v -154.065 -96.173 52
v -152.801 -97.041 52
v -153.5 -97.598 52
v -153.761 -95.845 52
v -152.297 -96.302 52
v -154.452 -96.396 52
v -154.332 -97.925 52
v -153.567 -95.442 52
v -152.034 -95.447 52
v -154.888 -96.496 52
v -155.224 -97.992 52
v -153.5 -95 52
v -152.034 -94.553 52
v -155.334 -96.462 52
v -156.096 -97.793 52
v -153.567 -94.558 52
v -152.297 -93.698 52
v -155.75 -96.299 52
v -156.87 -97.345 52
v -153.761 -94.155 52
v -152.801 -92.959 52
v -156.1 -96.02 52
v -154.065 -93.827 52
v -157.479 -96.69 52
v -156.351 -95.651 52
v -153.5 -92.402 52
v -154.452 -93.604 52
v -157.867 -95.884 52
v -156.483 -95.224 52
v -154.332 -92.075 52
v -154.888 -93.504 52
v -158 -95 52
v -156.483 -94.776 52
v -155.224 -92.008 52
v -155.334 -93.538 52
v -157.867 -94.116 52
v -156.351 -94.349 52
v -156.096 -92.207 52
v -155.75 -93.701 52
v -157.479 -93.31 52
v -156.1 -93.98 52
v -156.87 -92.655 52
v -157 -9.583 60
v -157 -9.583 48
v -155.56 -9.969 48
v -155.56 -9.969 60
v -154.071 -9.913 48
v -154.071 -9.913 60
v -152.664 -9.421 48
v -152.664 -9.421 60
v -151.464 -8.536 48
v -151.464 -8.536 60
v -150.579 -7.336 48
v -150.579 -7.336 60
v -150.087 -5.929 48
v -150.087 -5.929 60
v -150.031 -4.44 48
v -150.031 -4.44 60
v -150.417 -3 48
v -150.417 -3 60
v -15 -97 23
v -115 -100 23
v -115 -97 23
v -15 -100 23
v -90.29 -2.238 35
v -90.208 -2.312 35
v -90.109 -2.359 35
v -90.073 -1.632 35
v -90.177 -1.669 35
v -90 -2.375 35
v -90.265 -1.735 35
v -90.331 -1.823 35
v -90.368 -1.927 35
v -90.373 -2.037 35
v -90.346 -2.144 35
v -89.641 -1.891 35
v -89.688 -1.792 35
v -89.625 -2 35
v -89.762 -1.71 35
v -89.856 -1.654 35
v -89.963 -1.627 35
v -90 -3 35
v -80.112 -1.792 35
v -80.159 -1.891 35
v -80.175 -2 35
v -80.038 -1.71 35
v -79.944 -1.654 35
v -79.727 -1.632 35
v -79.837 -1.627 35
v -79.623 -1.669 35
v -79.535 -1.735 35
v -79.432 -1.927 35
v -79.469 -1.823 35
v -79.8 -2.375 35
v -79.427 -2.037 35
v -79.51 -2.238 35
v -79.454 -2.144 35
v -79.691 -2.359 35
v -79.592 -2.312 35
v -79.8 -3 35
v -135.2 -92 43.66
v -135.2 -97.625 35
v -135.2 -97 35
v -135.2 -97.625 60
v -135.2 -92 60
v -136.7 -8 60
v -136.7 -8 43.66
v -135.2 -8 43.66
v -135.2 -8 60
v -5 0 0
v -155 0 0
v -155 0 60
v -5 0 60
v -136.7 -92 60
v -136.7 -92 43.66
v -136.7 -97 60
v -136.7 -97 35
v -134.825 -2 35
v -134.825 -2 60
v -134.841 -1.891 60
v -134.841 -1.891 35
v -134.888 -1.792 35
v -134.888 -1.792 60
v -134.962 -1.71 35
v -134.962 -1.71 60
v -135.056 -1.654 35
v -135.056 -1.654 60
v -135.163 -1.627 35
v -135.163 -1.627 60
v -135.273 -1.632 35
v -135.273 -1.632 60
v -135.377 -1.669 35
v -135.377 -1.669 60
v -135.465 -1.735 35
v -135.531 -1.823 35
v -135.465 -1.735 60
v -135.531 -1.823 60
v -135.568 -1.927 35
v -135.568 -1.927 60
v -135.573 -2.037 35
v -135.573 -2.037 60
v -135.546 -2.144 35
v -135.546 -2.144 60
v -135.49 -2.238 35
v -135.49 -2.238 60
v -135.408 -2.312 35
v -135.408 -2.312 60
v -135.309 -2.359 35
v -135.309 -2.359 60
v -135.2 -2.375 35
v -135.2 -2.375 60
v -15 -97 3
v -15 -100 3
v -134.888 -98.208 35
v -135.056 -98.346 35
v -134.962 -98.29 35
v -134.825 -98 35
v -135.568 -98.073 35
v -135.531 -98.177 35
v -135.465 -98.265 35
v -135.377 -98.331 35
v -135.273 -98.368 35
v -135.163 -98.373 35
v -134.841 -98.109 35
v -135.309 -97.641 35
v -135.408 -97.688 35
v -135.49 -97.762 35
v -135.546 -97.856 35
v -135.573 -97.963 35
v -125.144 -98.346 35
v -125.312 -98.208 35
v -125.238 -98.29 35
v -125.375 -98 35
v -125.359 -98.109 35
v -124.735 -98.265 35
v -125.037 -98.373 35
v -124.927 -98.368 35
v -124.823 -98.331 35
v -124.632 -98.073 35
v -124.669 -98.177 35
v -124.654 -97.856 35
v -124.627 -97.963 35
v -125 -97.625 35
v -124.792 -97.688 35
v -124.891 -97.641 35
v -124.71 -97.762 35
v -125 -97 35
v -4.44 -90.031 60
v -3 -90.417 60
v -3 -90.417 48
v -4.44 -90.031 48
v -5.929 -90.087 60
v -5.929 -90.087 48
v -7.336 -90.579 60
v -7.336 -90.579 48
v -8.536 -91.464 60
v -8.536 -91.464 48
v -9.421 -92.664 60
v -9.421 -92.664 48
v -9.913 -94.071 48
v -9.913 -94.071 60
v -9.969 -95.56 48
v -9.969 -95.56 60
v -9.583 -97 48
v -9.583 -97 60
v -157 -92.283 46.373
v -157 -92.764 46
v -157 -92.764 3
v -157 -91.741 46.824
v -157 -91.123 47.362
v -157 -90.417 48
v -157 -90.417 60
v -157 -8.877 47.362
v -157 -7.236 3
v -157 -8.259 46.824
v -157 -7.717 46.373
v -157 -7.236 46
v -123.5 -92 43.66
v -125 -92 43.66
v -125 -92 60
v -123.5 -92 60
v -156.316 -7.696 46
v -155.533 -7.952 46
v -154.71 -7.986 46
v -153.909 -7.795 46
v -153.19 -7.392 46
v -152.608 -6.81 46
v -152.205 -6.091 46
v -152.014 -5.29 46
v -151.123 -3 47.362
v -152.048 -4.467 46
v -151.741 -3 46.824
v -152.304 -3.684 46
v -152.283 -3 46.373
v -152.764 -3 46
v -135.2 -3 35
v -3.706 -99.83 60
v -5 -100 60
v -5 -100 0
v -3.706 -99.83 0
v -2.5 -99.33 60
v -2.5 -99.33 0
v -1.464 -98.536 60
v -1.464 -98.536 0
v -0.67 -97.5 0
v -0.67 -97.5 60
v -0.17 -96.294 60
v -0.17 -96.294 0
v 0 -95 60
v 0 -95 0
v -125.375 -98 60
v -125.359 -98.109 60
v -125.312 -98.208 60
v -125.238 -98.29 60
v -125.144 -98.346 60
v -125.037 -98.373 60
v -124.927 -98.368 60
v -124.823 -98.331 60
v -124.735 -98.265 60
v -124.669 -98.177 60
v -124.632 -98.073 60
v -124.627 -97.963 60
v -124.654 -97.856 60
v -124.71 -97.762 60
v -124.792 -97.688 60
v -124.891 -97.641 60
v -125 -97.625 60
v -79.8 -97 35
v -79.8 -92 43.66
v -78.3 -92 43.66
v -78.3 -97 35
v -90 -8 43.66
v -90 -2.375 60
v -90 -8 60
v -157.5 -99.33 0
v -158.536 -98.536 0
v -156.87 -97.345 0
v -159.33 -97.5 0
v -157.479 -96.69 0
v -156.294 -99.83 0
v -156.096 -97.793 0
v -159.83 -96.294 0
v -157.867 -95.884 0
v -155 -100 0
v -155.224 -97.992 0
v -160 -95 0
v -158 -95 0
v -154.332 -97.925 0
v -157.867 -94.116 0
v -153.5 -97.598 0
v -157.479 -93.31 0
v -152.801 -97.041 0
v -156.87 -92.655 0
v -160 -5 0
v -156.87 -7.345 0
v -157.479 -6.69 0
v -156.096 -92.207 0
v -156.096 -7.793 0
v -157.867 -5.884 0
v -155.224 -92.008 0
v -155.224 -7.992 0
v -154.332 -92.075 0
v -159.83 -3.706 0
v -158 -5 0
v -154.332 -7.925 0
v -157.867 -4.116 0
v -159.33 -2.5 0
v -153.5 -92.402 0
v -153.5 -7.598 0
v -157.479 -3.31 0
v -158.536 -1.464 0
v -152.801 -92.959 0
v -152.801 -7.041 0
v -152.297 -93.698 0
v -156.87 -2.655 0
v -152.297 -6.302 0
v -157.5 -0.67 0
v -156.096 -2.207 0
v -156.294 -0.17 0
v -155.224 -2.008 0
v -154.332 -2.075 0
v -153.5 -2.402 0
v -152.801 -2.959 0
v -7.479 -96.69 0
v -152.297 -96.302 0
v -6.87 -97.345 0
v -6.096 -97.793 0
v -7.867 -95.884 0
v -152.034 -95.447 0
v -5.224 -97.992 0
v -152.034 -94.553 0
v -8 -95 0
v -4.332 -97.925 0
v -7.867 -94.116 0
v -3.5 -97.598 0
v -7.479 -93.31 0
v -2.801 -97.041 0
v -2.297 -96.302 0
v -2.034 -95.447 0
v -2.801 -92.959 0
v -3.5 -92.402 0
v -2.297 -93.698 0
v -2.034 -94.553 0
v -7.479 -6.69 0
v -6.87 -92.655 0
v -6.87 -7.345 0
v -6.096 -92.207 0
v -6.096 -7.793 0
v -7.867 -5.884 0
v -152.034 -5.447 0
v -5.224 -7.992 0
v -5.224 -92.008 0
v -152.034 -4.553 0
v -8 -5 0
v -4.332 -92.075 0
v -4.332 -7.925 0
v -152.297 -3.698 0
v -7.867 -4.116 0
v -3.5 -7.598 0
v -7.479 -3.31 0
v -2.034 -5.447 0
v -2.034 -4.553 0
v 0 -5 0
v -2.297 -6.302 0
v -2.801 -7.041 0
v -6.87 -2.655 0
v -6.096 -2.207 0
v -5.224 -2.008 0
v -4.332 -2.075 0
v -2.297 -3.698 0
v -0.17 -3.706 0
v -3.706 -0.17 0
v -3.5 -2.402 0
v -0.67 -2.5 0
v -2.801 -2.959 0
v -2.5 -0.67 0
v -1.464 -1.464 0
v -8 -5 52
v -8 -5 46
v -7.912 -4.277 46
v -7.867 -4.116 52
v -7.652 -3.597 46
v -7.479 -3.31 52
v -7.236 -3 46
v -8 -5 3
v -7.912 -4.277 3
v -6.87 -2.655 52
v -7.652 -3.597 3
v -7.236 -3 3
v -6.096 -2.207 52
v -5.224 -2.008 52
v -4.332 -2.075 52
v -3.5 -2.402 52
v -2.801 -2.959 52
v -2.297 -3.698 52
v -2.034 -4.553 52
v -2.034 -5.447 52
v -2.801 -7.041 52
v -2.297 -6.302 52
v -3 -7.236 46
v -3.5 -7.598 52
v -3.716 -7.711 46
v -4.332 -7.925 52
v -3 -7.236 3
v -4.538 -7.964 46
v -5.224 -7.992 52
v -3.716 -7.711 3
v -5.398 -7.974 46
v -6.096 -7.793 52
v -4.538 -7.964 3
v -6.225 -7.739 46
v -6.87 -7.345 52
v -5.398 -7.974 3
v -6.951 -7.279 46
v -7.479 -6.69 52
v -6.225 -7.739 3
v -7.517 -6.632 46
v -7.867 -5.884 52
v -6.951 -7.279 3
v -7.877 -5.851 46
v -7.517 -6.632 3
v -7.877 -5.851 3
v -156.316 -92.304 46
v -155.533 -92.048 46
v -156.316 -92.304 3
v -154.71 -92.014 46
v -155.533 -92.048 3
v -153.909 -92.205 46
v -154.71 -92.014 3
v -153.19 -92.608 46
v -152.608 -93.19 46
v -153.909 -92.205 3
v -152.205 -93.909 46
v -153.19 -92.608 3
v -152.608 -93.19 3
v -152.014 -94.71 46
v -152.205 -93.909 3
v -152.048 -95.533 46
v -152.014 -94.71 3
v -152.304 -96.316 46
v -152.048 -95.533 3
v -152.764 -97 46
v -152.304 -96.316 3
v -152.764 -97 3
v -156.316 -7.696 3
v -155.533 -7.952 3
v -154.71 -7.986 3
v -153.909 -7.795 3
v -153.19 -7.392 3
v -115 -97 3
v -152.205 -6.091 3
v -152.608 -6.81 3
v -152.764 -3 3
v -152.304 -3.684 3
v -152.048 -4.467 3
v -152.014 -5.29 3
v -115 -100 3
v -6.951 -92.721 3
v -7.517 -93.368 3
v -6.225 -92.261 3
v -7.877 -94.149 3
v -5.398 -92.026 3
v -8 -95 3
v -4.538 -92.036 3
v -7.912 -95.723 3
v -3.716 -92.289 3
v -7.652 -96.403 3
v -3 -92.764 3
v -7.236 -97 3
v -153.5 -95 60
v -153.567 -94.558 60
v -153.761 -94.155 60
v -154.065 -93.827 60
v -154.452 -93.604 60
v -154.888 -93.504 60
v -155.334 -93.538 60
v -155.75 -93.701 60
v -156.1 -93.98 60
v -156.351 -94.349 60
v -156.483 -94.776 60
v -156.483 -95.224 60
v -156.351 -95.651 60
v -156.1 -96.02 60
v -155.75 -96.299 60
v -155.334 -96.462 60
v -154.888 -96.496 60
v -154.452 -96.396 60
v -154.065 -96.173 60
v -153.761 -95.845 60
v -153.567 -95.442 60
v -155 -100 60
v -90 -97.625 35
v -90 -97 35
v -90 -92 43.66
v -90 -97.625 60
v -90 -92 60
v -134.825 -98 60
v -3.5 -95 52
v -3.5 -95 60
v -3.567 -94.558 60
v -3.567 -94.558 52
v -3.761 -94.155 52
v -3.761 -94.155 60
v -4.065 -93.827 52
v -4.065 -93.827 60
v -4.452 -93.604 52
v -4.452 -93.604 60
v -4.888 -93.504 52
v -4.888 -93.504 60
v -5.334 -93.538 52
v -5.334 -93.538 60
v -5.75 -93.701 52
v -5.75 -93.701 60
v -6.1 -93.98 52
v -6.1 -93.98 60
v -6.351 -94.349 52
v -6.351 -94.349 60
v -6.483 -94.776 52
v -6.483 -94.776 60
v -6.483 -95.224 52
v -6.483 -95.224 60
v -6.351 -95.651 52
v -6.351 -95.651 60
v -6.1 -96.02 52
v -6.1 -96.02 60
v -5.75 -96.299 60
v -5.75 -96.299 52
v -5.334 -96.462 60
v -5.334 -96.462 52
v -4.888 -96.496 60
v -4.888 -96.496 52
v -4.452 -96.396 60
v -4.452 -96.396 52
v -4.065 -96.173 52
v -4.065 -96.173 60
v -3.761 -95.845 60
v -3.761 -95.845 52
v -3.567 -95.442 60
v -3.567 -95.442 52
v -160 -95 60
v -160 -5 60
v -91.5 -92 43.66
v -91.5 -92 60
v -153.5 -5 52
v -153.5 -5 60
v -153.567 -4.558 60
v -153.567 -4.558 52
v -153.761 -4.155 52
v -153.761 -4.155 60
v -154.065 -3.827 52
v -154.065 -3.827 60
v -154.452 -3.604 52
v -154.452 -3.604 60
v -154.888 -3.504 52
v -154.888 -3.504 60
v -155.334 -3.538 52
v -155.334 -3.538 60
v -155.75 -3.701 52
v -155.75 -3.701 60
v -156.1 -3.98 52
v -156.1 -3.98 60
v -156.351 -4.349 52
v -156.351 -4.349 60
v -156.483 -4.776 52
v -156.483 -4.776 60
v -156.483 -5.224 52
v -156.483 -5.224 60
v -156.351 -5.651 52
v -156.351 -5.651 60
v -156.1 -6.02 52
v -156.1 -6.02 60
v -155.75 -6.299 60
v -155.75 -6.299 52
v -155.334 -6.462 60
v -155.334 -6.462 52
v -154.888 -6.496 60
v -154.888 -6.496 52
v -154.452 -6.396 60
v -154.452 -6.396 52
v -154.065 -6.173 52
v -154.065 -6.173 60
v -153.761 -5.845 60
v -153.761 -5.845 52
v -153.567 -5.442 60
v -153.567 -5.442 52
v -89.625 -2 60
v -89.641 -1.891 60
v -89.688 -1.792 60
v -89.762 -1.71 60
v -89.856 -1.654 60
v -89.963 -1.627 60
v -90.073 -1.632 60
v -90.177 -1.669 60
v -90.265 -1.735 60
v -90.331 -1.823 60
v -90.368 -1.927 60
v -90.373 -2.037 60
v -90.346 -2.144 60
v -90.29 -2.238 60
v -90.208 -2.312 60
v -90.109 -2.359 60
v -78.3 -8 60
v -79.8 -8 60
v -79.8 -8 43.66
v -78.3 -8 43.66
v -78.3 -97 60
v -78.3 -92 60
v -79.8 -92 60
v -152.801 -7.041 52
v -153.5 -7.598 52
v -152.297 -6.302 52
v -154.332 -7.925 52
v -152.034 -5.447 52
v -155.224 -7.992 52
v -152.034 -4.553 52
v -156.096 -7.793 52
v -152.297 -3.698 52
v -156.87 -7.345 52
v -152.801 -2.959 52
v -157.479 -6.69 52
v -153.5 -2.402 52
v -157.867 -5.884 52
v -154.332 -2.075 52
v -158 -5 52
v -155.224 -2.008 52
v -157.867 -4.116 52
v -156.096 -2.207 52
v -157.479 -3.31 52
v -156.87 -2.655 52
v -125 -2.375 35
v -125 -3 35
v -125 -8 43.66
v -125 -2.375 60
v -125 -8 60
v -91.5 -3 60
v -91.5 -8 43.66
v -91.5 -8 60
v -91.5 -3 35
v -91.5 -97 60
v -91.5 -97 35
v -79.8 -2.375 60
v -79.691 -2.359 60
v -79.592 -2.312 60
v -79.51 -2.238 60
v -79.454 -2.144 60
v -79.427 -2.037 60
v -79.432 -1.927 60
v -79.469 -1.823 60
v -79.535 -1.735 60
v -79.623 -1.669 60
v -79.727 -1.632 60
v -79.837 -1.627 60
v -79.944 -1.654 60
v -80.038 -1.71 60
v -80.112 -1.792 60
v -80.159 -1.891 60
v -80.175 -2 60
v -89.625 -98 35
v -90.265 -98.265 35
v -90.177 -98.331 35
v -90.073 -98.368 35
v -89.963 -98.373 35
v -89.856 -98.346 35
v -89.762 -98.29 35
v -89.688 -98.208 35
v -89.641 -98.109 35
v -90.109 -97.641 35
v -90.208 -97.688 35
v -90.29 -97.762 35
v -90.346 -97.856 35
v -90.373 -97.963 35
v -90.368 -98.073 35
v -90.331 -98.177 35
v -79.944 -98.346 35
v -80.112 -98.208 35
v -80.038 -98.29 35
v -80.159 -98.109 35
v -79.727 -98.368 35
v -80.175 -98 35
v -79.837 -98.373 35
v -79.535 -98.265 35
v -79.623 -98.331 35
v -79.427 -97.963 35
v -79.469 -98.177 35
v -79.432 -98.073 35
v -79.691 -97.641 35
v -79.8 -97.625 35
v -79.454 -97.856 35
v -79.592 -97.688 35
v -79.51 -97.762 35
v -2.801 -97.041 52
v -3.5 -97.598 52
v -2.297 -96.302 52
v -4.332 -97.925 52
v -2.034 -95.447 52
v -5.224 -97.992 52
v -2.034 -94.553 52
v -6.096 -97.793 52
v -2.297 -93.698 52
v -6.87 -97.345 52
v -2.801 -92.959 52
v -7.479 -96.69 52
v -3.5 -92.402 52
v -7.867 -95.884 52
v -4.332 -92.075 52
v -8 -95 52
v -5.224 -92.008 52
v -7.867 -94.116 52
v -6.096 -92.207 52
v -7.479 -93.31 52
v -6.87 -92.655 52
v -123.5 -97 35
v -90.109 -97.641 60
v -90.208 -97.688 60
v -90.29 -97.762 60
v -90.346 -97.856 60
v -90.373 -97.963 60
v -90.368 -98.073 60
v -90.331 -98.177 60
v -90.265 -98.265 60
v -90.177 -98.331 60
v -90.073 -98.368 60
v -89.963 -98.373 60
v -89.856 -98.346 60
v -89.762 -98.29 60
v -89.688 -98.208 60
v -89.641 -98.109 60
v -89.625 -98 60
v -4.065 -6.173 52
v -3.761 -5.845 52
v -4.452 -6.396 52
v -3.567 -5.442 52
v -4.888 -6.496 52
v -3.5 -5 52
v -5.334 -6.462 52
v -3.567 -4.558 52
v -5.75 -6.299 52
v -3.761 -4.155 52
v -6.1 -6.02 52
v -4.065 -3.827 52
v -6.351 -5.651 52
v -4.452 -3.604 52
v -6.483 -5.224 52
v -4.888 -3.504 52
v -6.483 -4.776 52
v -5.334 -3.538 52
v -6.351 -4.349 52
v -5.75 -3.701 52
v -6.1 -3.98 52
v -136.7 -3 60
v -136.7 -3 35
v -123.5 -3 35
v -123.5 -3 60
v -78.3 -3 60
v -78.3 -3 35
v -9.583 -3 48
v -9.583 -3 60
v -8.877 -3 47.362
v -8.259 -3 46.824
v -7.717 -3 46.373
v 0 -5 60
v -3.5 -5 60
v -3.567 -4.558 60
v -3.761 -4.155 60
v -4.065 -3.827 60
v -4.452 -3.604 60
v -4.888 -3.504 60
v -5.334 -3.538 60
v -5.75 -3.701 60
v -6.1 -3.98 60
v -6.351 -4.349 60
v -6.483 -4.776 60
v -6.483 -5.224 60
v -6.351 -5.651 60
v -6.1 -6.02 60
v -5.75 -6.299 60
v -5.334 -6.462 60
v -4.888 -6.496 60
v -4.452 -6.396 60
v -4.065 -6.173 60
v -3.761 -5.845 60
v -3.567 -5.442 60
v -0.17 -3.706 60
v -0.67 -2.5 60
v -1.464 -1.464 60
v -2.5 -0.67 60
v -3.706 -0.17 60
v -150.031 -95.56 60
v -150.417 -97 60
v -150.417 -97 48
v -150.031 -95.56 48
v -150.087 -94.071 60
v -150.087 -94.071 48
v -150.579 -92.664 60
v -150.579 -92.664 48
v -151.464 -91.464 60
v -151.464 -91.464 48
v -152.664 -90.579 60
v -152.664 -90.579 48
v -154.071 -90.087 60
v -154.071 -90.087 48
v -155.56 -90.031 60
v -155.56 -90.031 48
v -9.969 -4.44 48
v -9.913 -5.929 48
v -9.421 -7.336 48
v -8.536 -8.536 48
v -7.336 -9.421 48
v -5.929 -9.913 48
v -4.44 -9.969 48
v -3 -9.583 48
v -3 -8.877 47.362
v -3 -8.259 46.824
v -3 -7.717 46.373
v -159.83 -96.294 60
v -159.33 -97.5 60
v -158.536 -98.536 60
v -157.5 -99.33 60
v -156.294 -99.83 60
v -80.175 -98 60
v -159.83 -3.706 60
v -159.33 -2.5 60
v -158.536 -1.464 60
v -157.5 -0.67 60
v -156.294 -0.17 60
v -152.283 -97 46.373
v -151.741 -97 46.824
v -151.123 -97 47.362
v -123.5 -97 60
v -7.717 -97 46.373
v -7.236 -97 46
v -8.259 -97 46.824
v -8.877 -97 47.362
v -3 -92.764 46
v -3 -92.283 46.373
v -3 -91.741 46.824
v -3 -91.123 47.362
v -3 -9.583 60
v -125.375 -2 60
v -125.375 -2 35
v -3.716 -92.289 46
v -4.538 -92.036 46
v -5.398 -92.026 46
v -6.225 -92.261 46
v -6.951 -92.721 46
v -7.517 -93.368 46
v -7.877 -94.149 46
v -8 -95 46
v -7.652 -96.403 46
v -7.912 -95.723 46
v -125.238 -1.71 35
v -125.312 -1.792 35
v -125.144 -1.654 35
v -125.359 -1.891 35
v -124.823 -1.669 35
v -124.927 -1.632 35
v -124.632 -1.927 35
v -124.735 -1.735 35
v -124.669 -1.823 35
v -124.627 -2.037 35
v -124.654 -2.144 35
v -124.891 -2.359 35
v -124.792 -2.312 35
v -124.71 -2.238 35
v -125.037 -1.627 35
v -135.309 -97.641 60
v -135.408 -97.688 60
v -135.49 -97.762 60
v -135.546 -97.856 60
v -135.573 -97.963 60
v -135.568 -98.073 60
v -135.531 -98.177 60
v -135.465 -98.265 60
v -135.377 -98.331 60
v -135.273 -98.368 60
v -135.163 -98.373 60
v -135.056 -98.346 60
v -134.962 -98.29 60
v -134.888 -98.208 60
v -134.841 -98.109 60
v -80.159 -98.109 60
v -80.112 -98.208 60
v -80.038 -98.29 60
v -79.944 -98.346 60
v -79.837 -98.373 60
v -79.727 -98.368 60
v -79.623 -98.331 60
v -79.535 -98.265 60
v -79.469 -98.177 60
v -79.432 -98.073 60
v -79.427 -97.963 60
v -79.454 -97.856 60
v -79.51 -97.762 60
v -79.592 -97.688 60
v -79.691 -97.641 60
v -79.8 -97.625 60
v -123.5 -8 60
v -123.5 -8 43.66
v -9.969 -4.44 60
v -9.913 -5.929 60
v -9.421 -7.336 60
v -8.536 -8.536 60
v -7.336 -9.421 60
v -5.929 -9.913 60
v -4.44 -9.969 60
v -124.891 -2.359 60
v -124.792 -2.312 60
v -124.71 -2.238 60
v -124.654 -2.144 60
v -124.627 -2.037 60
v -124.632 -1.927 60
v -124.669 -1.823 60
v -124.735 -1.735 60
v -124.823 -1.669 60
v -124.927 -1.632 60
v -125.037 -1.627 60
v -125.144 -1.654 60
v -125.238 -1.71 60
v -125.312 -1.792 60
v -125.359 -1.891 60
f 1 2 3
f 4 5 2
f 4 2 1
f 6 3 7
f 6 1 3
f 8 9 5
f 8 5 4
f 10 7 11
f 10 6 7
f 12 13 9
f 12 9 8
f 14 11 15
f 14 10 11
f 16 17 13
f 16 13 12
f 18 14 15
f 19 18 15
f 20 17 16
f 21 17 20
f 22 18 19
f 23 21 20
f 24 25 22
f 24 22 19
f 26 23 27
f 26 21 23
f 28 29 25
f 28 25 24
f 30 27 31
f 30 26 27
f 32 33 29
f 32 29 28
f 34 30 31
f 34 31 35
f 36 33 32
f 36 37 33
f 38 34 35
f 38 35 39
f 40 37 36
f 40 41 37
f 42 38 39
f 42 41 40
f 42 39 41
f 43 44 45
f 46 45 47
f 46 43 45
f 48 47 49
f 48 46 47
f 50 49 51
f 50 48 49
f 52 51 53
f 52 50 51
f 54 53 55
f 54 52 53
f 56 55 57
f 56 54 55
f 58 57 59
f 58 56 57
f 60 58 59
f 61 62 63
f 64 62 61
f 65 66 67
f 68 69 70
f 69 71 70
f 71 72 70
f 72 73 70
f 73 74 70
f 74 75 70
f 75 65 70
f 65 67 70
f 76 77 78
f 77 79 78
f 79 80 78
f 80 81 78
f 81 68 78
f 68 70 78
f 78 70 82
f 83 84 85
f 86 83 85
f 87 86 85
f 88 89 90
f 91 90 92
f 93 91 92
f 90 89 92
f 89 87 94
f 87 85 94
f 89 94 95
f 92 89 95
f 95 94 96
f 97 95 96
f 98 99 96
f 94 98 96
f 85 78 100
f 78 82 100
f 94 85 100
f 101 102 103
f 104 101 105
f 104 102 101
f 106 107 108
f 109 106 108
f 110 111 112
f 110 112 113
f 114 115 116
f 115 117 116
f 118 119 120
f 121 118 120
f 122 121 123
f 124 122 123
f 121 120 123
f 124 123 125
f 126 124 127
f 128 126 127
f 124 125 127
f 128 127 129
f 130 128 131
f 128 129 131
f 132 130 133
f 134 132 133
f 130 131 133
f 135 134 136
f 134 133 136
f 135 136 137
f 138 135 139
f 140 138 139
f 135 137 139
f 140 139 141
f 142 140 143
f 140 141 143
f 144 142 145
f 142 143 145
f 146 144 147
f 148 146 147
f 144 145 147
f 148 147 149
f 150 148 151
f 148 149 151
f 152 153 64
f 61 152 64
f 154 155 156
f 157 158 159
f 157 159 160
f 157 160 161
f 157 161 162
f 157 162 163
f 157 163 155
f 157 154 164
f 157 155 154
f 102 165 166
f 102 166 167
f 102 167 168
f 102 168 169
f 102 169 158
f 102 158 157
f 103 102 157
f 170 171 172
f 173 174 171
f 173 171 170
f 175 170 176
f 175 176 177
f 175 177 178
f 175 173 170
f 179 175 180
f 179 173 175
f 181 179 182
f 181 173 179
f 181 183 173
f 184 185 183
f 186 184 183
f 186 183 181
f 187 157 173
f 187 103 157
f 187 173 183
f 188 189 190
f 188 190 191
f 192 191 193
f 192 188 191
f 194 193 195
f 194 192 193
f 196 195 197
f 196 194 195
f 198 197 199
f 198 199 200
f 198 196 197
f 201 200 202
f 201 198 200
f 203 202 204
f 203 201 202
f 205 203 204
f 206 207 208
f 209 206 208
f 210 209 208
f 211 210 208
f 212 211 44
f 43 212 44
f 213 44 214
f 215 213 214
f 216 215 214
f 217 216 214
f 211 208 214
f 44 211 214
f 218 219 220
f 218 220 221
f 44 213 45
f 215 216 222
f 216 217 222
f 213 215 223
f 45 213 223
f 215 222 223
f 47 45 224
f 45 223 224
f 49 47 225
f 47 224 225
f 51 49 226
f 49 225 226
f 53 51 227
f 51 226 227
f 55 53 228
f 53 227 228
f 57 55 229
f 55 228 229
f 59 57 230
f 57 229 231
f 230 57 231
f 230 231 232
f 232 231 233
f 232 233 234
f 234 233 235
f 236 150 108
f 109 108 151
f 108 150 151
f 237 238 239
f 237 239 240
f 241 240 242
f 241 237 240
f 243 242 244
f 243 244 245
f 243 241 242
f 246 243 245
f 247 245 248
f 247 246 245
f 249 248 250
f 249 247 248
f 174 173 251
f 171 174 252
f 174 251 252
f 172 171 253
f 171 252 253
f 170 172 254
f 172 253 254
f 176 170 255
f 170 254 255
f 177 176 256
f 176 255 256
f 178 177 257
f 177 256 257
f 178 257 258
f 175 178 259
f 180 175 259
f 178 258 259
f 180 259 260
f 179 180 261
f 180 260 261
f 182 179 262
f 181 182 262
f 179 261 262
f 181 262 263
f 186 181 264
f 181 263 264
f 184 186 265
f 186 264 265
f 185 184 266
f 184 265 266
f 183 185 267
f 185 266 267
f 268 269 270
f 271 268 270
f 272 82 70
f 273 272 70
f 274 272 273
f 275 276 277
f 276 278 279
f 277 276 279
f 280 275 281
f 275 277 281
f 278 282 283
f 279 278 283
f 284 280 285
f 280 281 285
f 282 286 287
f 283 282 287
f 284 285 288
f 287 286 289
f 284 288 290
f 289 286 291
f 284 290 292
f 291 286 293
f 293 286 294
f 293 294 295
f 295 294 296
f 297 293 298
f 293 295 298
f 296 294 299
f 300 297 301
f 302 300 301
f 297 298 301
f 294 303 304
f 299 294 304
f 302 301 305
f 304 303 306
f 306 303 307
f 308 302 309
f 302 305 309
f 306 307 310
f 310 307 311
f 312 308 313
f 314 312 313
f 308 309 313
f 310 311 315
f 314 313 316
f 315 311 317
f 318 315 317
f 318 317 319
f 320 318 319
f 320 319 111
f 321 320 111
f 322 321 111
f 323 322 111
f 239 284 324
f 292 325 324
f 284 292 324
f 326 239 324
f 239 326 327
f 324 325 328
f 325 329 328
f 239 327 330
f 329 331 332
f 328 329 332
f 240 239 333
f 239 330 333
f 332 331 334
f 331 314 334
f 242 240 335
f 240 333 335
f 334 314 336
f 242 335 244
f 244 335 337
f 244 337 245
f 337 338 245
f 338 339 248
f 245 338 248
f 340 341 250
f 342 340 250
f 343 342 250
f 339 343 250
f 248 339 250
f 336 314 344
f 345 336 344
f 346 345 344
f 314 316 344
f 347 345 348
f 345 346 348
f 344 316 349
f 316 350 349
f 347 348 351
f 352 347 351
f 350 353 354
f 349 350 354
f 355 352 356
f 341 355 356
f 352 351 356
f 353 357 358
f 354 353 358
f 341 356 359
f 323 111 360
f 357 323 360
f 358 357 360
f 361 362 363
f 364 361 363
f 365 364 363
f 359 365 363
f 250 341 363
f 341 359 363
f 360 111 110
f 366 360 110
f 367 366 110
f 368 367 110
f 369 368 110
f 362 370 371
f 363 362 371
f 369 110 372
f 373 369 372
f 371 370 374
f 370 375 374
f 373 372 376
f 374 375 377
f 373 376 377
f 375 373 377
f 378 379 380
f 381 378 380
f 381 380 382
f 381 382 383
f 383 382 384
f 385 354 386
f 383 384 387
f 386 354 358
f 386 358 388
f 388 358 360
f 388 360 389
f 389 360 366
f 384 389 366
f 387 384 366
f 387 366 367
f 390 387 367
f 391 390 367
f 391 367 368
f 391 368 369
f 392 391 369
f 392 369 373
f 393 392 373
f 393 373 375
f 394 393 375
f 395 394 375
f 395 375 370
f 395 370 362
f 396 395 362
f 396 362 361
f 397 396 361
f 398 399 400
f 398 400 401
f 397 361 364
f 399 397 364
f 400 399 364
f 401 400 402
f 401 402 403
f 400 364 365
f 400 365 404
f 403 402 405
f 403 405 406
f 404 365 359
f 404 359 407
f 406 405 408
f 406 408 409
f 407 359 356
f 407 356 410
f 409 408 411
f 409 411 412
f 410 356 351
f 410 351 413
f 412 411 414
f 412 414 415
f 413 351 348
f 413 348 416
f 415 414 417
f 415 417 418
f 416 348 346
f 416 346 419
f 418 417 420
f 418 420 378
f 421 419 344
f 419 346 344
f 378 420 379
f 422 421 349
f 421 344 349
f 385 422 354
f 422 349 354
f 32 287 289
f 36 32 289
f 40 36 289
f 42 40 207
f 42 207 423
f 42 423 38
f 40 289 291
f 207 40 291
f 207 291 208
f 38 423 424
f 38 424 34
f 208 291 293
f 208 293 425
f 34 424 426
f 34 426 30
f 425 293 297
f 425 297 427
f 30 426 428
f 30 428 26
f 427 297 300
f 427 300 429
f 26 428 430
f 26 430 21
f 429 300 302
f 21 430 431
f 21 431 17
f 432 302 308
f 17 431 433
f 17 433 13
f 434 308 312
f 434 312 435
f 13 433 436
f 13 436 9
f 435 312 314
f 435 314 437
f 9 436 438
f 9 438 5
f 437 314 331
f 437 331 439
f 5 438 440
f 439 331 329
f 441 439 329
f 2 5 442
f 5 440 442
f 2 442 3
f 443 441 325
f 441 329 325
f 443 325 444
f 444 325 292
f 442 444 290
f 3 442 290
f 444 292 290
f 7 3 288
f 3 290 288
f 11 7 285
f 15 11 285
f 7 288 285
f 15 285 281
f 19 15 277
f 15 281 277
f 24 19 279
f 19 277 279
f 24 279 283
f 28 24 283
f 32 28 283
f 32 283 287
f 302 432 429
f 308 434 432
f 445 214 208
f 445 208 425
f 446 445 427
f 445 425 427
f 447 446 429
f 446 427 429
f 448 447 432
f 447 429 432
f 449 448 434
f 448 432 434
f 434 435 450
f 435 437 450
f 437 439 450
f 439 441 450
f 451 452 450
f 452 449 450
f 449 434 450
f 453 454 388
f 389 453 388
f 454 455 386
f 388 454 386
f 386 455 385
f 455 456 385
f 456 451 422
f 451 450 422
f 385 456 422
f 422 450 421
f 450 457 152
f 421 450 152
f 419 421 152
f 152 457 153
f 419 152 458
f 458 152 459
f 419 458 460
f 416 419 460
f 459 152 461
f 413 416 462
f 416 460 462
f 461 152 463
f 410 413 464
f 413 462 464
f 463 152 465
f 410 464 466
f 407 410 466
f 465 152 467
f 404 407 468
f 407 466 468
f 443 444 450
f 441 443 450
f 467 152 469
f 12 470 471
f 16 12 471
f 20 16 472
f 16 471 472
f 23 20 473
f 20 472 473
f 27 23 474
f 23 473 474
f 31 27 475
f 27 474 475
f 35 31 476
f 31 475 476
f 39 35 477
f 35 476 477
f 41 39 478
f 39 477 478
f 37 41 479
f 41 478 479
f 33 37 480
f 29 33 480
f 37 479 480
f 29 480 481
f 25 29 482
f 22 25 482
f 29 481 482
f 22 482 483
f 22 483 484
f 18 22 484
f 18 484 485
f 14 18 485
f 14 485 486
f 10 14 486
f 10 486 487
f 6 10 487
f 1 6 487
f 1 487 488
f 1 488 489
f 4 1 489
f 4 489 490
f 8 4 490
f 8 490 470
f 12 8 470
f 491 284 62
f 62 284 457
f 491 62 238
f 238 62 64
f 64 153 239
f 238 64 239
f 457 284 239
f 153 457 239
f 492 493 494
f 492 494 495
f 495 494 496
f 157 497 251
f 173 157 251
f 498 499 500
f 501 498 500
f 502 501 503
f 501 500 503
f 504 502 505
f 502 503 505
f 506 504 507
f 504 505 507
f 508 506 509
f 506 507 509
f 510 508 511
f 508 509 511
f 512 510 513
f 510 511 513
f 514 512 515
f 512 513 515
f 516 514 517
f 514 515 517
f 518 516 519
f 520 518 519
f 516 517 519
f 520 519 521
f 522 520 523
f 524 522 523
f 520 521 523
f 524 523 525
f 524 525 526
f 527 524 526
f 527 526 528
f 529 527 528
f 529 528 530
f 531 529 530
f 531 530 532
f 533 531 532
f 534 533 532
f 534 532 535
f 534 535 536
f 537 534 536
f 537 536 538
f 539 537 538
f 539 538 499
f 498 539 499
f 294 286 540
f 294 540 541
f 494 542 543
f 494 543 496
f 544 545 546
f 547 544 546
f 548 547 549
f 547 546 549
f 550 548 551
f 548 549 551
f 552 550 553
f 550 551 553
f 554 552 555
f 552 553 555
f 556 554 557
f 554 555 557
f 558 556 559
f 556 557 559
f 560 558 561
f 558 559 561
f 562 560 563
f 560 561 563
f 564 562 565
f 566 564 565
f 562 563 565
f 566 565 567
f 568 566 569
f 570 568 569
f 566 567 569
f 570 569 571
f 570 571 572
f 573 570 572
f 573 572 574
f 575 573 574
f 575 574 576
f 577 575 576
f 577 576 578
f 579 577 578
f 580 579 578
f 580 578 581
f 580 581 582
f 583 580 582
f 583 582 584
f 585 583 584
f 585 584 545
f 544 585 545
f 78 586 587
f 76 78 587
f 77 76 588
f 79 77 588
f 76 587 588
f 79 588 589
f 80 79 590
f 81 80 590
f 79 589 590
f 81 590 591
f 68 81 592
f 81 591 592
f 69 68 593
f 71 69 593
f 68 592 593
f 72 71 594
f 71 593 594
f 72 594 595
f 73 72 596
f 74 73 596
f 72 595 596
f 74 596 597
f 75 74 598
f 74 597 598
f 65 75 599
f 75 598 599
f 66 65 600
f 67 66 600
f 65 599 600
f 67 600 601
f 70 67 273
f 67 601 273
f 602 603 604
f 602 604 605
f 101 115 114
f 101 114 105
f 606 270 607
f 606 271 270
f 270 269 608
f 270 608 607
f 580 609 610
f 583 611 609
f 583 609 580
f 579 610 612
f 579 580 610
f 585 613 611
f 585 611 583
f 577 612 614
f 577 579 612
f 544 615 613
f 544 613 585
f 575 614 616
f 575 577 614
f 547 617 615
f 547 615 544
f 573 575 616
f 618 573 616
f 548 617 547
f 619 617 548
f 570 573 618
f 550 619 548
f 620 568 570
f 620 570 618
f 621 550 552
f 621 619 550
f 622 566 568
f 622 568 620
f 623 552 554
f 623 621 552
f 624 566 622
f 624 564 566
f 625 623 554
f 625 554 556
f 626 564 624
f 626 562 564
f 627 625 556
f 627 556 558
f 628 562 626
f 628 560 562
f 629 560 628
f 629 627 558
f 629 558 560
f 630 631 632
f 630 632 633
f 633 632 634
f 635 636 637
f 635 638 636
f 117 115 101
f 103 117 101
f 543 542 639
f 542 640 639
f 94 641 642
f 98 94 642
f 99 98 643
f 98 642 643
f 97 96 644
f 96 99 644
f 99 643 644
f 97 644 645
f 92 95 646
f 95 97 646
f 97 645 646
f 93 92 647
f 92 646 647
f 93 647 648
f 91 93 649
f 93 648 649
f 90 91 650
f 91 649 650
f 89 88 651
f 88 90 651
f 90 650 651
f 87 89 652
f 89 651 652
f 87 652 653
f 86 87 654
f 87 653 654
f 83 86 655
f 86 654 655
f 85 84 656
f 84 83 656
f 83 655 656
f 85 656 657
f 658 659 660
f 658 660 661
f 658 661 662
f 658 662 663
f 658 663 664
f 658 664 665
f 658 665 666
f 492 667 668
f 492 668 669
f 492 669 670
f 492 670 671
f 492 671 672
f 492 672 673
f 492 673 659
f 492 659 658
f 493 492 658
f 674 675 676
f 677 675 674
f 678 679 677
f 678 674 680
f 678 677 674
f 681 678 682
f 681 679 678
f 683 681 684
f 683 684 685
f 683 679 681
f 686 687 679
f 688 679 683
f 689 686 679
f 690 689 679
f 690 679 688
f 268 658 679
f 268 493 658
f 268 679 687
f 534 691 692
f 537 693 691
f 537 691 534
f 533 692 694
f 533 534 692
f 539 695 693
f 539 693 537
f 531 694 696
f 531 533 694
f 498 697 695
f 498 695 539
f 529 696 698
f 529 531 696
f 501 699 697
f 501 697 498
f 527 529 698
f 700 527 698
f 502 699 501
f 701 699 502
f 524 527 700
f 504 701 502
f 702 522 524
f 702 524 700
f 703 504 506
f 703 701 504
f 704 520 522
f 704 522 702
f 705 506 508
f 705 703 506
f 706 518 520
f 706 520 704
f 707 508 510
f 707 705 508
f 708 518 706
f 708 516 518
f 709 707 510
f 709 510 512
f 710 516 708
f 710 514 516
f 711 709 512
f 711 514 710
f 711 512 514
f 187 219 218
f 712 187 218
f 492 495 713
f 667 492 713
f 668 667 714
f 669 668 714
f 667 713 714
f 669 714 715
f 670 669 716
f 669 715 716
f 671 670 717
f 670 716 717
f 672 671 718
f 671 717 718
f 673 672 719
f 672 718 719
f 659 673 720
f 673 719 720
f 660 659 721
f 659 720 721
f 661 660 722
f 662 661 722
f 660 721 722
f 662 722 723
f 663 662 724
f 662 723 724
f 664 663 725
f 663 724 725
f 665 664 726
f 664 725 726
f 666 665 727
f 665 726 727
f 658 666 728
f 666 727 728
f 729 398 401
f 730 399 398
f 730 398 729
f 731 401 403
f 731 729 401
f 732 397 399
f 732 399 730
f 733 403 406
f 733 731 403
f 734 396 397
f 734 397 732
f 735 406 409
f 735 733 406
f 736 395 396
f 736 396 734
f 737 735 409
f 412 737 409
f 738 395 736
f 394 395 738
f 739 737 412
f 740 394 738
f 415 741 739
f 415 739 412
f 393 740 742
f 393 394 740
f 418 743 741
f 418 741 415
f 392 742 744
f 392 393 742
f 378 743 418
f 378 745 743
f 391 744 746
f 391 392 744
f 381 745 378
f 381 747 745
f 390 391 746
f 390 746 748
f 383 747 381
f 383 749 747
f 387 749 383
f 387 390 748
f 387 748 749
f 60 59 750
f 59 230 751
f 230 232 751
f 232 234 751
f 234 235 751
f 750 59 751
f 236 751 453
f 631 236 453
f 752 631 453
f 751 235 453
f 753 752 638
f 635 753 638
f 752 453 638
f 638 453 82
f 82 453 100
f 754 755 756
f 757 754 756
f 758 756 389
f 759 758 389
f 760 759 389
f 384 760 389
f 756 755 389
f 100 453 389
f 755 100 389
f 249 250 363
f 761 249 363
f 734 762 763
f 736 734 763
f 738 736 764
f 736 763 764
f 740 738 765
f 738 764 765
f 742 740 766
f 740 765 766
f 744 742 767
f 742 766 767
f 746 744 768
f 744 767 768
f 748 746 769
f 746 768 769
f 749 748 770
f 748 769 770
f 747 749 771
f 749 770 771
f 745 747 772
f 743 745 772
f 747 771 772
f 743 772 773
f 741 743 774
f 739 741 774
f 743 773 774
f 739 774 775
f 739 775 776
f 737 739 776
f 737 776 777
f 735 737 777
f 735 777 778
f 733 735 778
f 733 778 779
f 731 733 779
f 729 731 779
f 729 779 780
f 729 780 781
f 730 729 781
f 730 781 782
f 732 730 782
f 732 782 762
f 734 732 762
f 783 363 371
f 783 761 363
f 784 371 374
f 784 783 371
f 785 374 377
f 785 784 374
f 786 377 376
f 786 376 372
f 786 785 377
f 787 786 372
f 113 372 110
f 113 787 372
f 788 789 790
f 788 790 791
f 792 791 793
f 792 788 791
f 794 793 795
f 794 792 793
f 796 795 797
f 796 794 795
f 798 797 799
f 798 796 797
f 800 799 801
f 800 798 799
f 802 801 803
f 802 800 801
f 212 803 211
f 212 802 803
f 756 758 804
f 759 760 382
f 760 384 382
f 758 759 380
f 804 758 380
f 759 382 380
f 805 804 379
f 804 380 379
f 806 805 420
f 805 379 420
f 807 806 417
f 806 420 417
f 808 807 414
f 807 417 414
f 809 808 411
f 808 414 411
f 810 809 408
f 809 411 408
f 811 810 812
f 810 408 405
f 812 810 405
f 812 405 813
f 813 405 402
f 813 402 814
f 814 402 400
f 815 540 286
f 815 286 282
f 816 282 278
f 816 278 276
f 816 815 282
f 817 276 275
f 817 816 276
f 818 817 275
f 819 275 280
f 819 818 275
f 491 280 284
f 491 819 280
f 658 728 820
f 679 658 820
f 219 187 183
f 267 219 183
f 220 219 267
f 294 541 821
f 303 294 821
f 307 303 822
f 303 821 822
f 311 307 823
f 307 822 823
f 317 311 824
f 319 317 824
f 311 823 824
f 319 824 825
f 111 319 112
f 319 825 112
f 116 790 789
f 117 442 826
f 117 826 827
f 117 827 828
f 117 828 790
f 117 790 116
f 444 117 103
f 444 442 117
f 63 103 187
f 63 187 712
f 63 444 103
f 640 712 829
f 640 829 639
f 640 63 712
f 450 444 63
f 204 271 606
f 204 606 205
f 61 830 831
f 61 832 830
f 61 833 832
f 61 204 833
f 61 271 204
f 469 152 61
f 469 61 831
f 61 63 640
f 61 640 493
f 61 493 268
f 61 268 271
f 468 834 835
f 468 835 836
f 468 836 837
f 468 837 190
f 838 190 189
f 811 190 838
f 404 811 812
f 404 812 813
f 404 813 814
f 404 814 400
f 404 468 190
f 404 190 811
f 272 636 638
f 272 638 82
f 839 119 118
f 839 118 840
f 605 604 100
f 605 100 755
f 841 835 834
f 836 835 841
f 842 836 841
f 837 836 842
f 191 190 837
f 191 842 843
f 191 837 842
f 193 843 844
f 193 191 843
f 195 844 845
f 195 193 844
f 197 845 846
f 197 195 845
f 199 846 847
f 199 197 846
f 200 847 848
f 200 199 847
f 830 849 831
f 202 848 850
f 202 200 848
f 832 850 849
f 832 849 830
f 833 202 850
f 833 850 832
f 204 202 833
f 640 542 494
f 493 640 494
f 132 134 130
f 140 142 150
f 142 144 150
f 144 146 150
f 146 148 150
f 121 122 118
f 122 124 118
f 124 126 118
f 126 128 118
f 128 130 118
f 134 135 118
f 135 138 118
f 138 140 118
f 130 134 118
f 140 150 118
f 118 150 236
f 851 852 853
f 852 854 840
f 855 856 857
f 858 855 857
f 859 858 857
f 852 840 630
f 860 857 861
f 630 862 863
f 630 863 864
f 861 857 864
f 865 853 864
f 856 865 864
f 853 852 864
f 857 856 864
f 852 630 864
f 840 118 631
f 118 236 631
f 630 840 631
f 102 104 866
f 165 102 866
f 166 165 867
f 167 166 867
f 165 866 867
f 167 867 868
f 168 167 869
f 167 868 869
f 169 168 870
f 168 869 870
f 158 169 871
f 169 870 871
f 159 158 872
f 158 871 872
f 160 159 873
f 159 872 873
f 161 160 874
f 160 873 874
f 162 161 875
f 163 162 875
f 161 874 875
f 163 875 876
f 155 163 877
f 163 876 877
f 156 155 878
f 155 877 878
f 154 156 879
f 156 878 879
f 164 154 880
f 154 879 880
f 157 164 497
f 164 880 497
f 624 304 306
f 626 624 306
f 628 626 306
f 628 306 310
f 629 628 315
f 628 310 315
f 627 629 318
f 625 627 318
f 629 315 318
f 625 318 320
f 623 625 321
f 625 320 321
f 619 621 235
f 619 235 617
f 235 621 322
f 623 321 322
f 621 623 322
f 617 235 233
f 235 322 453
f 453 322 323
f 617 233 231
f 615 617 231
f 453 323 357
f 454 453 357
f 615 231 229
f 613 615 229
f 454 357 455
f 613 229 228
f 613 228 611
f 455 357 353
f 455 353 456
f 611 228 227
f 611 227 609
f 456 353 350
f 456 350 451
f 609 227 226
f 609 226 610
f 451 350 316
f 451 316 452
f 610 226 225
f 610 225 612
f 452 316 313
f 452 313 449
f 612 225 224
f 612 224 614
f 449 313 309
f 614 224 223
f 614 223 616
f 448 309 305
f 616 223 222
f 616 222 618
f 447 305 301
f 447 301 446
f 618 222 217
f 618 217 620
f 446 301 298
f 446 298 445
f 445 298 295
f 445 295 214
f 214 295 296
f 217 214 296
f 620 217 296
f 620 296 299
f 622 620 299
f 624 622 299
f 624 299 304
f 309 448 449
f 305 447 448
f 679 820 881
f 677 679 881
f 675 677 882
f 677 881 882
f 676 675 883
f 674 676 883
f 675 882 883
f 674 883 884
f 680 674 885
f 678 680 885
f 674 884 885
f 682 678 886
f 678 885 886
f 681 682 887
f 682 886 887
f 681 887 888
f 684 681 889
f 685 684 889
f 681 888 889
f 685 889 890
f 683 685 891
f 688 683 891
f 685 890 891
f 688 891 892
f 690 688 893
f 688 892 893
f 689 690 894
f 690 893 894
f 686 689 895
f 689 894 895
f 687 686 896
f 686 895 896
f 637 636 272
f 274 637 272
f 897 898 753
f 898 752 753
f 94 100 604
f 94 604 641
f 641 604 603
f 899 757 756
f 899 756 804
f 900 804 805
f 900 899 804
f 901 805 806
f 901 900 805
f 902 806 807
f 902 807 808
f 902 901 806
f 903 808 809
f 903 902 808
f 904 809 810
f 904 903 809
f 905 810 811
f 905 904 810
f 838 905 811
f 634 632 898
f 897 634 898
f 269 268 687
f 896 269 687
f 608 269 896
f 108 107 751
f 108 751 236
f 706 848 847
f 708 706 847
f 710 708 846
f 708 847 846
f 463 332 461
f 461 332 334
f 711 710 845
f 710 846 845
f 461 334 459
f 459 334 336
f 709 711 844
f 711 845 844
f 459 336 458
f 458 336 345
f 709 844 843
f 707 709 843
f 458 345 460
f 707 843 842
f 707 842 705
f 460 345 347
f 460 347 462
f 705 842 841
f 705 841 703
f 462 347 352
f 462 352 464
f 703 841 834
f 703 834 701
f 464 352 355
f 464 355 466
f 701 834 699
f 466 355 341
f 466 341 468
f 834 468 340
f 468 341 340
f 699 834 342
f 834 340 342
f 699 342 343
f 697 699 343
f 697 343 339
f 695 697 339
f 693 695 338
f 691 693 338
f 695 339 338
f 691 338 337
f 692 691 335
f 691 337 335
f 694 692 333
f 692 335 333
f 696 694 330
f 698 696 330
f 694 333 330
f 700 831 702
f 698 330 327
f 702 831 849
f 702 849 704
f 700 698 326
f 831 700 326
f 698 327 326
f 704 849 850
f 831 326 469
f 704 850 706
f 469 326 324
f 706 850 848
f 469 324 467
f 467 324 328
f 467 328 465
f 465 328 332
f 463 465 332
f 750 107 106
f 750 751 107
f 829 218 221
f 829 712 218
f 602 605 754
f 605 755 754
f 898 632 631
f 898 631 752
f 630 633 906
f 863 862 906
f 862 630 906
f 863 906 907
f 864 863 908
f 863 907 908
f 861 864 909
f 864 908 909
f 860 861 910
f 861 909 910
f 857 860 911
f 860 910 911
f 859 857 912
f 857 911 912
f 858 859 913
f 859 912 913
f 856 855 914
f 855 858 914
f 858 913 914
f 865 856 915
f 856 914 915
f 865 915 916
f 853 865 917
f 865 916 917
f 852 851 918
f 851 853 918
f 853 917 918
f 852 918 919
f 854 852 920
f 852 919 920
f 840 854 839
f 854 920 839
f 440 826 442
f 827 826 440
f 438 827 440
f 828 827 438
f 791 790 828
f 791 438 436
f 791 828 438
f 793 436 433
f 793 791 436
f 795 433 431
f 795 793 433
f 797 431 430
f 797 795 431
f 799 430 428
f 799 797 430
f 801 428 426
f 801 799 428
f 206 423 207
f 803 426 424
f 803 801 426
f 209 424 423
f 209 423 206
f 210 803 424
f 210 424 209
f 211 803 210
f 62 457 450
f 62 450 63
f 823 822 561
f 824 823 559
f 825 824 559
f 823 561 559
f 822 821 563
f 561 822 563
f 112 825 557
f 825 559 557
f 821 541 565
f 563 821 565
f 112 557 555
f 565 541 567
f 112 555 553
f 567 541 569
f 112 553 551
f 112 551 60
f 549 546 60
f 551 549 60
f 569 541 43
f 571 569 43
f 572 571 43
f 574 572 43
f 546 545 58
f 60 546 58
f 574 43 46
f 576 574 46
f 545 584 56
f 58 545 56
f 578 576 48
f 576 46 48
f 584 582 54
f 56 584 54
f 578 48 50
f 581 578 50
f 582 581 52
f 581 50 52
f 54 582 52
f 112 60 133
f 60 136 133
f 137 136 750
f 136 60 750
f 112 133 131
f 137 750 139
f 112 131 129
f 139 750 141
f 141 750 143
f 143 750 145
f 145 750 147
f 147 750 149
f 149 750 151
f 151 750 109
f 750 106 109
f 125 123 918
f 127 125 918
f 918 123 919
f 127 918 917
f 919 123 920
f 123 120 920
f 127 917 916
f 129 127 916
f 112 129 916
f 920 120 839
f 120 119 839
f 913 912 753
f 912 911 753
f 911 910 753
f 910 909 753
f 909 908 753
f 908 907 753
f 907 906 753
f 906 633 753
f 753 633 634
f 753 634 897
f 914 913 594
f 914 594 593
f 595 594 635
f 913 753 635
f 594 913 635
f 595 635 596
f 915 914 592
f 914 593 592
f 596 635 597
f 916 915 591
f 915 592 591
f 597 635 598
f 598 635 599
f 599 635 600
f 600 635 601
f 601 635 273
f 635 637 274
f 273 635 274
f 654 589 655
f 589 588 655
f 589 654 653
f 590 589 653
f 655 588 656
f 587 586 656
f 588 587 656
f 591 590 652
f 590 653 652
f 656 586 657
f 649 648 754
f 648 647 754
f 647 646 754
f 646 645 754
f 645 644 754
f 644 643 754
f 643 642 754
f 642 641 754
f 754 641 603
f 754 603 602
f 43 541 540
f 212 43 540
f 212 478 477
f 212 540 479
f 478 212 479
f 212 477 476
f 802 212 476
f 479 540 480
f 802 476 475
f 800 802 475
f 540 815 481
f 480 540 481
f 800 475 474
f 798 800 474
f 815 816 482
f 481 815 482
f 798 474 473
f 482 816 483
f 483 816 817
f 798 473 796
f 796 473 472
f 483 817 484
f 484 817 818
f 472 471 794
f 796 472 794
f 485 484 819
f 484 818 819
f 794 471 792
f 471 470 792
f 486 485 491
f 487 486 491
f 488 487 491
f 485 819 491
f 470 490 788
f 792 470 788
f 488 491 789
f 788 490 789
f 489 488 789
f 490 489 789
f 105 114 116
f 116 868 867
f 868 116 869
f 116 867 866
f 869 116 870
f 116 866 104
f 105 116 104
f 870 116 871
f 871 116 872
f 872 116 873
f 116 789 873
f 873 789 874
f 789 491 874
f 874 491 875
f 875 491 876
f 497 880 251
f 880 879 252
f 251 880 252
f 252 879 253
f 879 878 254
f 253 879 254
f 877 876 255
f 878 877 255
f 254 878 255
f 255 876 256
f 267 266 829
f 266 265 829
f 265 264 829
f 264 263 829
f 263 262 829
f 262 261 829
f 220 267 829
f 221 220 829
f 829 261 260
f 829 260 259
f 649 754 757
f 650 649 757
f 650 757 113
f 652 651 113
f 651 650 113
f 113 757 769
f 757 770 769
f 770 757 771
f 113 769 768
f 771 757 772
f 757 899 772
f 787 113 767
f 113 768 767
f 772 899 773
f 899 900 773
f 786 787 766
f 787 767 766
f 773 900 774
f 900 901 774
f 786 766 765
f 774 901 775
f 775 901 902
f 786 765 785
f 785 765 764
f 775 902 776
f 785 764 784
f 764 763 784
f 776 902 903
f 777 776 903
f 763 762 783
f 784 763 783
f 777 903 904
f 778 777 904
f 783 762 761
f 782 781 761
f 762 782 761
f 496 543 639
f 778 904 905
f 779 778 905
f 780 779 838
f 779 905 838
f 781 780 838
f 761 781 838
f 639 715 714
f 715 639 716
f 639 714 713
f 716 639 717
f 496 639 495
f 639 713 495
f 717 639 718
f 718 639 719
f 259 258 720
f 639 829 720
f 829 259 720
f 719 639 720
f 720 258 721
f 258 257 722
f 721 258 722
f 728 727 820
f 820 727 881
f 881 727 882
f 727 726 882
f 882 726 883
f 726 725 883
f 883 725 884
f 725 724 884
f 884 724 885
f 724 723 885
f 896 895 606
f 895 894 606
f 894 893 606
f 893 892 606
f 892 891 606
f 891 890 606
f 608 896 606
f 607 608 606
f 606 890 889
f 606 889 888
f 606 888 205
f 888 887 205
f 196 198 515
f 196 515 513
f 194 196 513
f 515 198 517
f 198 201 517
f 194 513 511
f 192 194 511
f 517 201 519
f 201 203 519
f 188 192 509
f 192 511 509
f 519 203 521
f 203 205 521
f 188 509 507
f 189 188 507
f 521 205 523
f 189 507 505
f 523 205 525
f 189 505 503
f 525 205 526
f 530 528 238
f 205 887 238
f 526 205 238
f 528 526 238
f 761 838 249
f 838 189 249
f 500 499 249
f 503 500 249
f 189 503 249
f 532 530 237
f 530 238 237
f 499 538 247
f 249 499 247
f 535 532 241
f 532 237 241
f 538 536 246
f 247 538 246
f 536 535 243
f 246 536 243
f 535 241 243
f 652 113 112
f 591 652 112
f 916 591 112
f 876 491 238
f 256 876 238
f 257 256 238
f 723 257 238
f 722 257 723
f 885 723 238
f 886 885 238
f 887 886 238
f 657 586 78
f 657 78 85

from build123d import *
from OCP.BRepFilletAPI import BRepFilletAPI_MakeChamfer

# Parameters (mm, degrees)
BASESHAPE_W                = 160
BASESHAPE_H                = 100
CONTAINERBASE_DEPTH        = 60
SIDECORNERFILLET_R         = 5
CONTAINERSHELL_T           = -3
SLOTSKETCH_W               = 10.2
SLOTSKETCH_H               = 25
SLOTCUT_DEPTH              = 1
VIEWELECTRONICSHOLE_REACH  = 199.99
ELECTRONICSVIEWHOLE_W      = 100
ELECTRONICSVIEWHOLE_H      = 20
SCREWSUPPORTS_R            = 5
BOSS_EXTRUDE3_DEPTH        = 15
SCREWSUPPORTTAPER_SIZE     = 3
SKETCH5_R                  = 3
COUNTERSINKCUT_DEPTH       = 52
SKETCH6_R                  = 1.5
SCREWHOLES_DEPTH           = 52
SKETCH7_W                  = 1.5
SKETCH7_H                  = 25
BOSS_EXTRUDE4_DEPTH        = 5
CHAMFER1_SIZE              = 8.660254038
CHAMFER1_SIZE_2            = 5
CHAMFER1_OF_MIRROR3_SIZE   = 5
CHAMFER1_OF_MIRROR3_SIZE_2 = 8.660254038
SKETCH8_R                  = 0.375
CUT_EXTRUDE1_DEPTH         = 25


with BuildPart() as part:
    # BaseShape → ContainerBase (new body)
    with BuildSketch(Plane.XY):
        with Locations((-80, -50)):
            Rectangle(BASESHAPE_W, BASESHAPE_H)
    extrude(amount=CONTAINERBASE_DEPTH)

    # SideCornerFillet
    sidecornerfillet_edges = [part.edges().sort_by_distance(p)[0] for p in [
        (0, -100, 30),
        (-160, -100, 30),
        (-160, 0, 30),
        (0, 0, 30),
    ]]
    fillet(sidecornerfillet_edges, radius=SIDECORNERFILLET_R)

    # ContainerShell
    containershell_openings = [part.faces().sort_by_distance(p)[0] for p in [
        (-80, -50, 60),
    ]]
    offset(amount=CONTAINERSHELL_T, openings=containershell_openings, kind=Kind.INTERSECTION)

    # SlotSketch → SlotCut (cut)
    with BuildSketch(Plane.XZ.offset(3)):
        with Locations((-130.1, 47.5)):
            Rectangle(SLOTSKETCH_W, SLOTSKETCH_H)
        with Locations((-84.9, 47.5)):
            Rectangle(SLOTSKETCH_W, SLOTSKETCH_H)
    slotcut = extrude(amount=-SLOTCUT_DEPTH, mode=Mode.SUBTRACT)

    # MirrorSlots: SlotCut across plane
    add(slotcut.mirror(Plane(origin=(0, -50, 0), x_dir=(0, 0, 1), z_dir=(0, -1, 0))), mode=Mode.SUBTRACT)

    # ElectronicsViewHole → ViewElectronicsHole (cut, up to next)
    with BuildSketch(Plane.XZ.offset(100), mode=Mode.PRIVATE) as viewelectronicshole_sk1:
        with Locations((-65, 13)):
            Rectangle(ELECTRONICSVIEWHOLE_W, ELECTRONICSVIEWHOLE_H)
    viewelectronicshole_tool1 = extrude(viewelectronicshole_sk1.sketch, amount=-VIEWELECTRONICSHOLE_REACH, mode=Mode.PRIVATE) & part.part
    add(viewelectronicshole_tool1.solids().sort_by_distance((-65, -100, 13))[0], mode=Mode.SUBTRACT)

    # ScrewSupports → Boss-Extrude3 (add)
    with BuildSketch(Plane.XY.offset(60)):
        with Locations((-155, -5)):
            Circle(SCREWSUPPORTS_R)
        with Locations((-155, -95)):
            Circle(SCREWSUPPORTS_R)
        with Locations((-5, -95)):
            Circle(SCREWSUPPORTS_R)
        with Locations((-5, -5)):
            Circle(SCREWSUPPORTS_R)
    extrude(amount=-BOSS_EXTRUDE3_DEPTH)

    # ScrewSupportTaper
    screwsupporttaper_edges = [part.edges().sort_by_distance(p)[0] for p in [
        (-151.464466094, -8.535533906, 45),
        (-8.535533906, -91.464466094, 45),
        (-8.535533906, -8.535533906, 45),
        (-151.464466094, -91.464466094, 45),
    ]]
    chamfer(screwsupporttaper_edges, length=SCREWSUPPORTTAPER_SIZE)

    # Sketch5 → CounterSinkCut (cut)
    with BuildSketch(Plane(origin=(0, 0, 0), x_dir=(-1, 0, 0), z_dir=(0, 0, -1))):
        with Locations((5, -5)):
            Circle(SKETCH5_R)
        with Locations((5, -95)):
            Circle(SKETCH5_R)
        with Locations((155, -95)):
            Circle(SKETCH5_R)
        with Locations((155, -5)):
            Circle(SKETCH5_R)
    extrude(amount=-COUNTERSINKCUT_DEPTH, mode=Mode.SUBTRACT)

    # Sketch6 → ScrewHoles (cut)
    with BuildSketch(Plane.XY.offset(60)):
        with Locations((-155, -5)):
            Circle(SKETCH6_R)
        with Locations((-155, -95)):
            Circle(SKETCH6_R)
        with Locations((-5, -95)):
            Circle(SKETCH6_R)
        with Locations((-5, -5)):
            Circle(SKETCH6_R)
    extrude(amount=-SCREWHOLES_DEPTH, mode=Mode.SUBTRACT)

    # Sketch7 → Boss-Extrude4 (add)
    with BuildSketch(Plane.XZ.offset(3)):
        with Locations((-135.95, 47.5)):
            Rectangle(SKETCH7_W, SKETCH7_H)
        with Locations((-124.25, 47.5)):
            Rectangle(SKETCH7_W, SKETCH7_H)
        with Locations((-90.75, 47.5)):
            Rectangle(SKETCH7_W, SKETCH7_H)
        with Locations((-79.05, 47.5)):
            Rectangle(SKETCH7_W, SKETCH7_H)
    boss_extrude4 = extrude(amount=BOSS_EXTRUDE4_DEPTH)

    # Chamfer1
    chamfer1_edges_1 = [part.edges().sort_by_distance(p)[0] for p in [
        (-135.95, -8, 35),
    ]]
    chamfer1_side_1 = [part.faces().sort_by_distance(p)[0] for p in [
        (-135.95, -8, 35.1),
    ]]
    chamfer1_edges_2 = [part.edges().sort_by_distance(p)[0] for p in [
        (-124.25, -8, 35),
    ]]
    chamfer1_side_2 = [part.faces().sort_by_distance(p)[0] for p in [
        (-124.25, -8, 35.1),
    ]]
    chamfer1_edges_3 = [part.edges().sort_by_distance(p)[0] for p in [
        (-79.05, -8, 35),
    ]]
    chamfer1_side_3 = [part.faces().sort_by_distance(p)[0] for p in [
        (-79.05, -8, 35.1),
    ]]
    chamfer1_edges_4 = [part.edges().sort_by_distance(p)[0] for p in [
        (-90.75, -8, 35),
    ]]
    chamfer1_side_4 = [part.faces().sort_by_distance(p)[0] for p in [
        (-90.75, -8, 35.1),
    ]]
    chamfer1 = BRepFilletAPI_MakeChamfer(part.part.solid().wrapped)
    for e in chamfer1_edges_1:
        chamfer1.Add(CHAMFER1_SIZE - 0.0001, CHAMFER1_SIZE_2 - 0.0001, e.wrapped, chamfer1_side_1[0].wrapped)
    for e in chamfer1_edges_2:
        chamfer1.Add(CHAMFER1_SIZE - 0.0001, CHAMFER1_SIZE_2 - 0.0001, e.wrapped, chamfer1_side_2[0].wrapped)
    for e in chamfer1_edges_3:
        chamfer1.Add(CHAMFER1_SIZE - 0.0001, CHAMFER1_SIZE_2 - 0.0001, e.wrapped, chamfer1_side_3[0].wrapped)
    for e in chamfer1_edges_4:
        chamfer1.Add(CHAMFER1_SIZE - 0.0001, CHAMFER1_SIZE_2 - 0.0001, e.wrapped, chamfer1_side_4[0].wrapped)
    add(Compound.cast(chamfer1.Shape()), mode=Mode.REPLACE)  # a hair under: the kernel refuses the full size

    # Mirror3: Boss-Extrude4 across plane
    add(boss_extrude4.mirror(Plane.ZX.offset(-50)))

    # Chamfer1 of Mirror3
    chamfer1_of_mirror3_edges_1 = [part.edges().sort_by_distance(p)[0] for p in [
        (-135.95, -92, 35),
    ]]
    chamfer1_of_mirror3_side_1 = [part.faces().sort_by_distance(p)[0] for p in [
        (-135.95, -92.1, 35),
    ]]
    chamfer1_of_mirror3_edges_2 = [part.edges().sort_by_distance(p)[0] for p in [
        (-124.25, -92, 35),
    ]]
    chamfer1_of_mirror3_side_2 = [part.faces().sort_by_distance(p)[0] for p in [
        (-124.25, -92.1, 35),
    ]]
    chamfer1_of_mirror3_edges_3 = [part.edges().sort_by_distance(p)[0] for p in [
        (-79.05, -92, 35),
    ]]
    chamfer1_of_mirror3_side_3 = [part.faces().sort_by_distance(p)[0] for p in [
        (-79.05, -92.1, 35),
    ]]
    chamfer1_of_mirror3_edges_4 = [part.edges().sort_by_distance(p)[0] for p in [
        (-90.75, -92, 35),
    ]]
    chamfer1_of_mirror3_side_4 = [part.faces().sort_by_distance(p)[0] for p in [
        (-90.75, -92.1, 35),
    ]]
    chamfer1_of_mirror3 = BRepFilletAPI_MakeChamfer(part.part.solid().wrapped)
    for e in chamfer1_of_mirror3_edges_1:
        chamfer1_of_mirror3.Add(CHAMFER1_OF_MIRROR3_SIZE - 0.0001, CHAMFER1_OF_MIRROR3_SIZE_2 - 0.0001, e.wrapped, chamfer1_of_mirror3_side_1[0].wrapped)
    for e in chamfer1_of_mirror3_edges_2:
        chamfer1_of_mirror3.Add(CHAMFER1_OF_MIRROR3_SIZE - 0.0001, CHAMFER1_OF_MIRROR3_SIZE_2 - 0.0001, e.wrapped, chamfer1_of_mirror3_side_2[0].wrapped)
    for e in chamfer1_of_mirror3_edges_3:
        chamfer1_of_mirror3.Add(CHAMFER1_OF_MIRROR3_SIZE - 0.0001, CHAMFER1_OF_MIRROR3_SIZE_2 - 0.0001, e.wrapped, chamfer1_of_mirror3_side_3[0].wrapped)
    for e in chamfer1_of_mirror3_edges_4:
        chamfer1_of_mirror3.Add(CHAMFER1_OF_MIRROR3_SIZE - 0.0001, CHAMFER1_OF_MIRROR3_SIZE_2 - 0.0001, e.wrapped, chamfer1_of_mirror3_side_4[0].wrapped)
    add(Compound.cast(chamfer1_of_mirror3.Shape()), mode=Mode.REPLACE)  # a hair under: the kernel refuses the full size

    # Sketch8 → Cut-Extrude1 (cut)
    with BuildSketch(Plane.XY.offset(60)):
        with Locations((-135.2, -2)):
            Circle(SKETCH8_R)
        with Locations((-125, -2)):
            Circle(SKETCH8_R)
        with Locations((-90, -2)):
            Circle(SKETCH8_R)
        with Locations((-79.8, -2)):
            Circle(SKETCH8_R)
        with Locations((-135.2, -98)):
            Circle(SKETCH8_R)
        with Locations((-90, -98)):
            Circle(SKETCH8_R)
        with Locations((-125, -98)):
            Circle(SKETCH8_R)
        with Locations((-79.8, -98)):
            Circle(SKETCH8_R)
    extrude(amount=-CUT_EXTRUDE1_DEPTH, mode=Mode.SUBTRACT)


solid = part.part
